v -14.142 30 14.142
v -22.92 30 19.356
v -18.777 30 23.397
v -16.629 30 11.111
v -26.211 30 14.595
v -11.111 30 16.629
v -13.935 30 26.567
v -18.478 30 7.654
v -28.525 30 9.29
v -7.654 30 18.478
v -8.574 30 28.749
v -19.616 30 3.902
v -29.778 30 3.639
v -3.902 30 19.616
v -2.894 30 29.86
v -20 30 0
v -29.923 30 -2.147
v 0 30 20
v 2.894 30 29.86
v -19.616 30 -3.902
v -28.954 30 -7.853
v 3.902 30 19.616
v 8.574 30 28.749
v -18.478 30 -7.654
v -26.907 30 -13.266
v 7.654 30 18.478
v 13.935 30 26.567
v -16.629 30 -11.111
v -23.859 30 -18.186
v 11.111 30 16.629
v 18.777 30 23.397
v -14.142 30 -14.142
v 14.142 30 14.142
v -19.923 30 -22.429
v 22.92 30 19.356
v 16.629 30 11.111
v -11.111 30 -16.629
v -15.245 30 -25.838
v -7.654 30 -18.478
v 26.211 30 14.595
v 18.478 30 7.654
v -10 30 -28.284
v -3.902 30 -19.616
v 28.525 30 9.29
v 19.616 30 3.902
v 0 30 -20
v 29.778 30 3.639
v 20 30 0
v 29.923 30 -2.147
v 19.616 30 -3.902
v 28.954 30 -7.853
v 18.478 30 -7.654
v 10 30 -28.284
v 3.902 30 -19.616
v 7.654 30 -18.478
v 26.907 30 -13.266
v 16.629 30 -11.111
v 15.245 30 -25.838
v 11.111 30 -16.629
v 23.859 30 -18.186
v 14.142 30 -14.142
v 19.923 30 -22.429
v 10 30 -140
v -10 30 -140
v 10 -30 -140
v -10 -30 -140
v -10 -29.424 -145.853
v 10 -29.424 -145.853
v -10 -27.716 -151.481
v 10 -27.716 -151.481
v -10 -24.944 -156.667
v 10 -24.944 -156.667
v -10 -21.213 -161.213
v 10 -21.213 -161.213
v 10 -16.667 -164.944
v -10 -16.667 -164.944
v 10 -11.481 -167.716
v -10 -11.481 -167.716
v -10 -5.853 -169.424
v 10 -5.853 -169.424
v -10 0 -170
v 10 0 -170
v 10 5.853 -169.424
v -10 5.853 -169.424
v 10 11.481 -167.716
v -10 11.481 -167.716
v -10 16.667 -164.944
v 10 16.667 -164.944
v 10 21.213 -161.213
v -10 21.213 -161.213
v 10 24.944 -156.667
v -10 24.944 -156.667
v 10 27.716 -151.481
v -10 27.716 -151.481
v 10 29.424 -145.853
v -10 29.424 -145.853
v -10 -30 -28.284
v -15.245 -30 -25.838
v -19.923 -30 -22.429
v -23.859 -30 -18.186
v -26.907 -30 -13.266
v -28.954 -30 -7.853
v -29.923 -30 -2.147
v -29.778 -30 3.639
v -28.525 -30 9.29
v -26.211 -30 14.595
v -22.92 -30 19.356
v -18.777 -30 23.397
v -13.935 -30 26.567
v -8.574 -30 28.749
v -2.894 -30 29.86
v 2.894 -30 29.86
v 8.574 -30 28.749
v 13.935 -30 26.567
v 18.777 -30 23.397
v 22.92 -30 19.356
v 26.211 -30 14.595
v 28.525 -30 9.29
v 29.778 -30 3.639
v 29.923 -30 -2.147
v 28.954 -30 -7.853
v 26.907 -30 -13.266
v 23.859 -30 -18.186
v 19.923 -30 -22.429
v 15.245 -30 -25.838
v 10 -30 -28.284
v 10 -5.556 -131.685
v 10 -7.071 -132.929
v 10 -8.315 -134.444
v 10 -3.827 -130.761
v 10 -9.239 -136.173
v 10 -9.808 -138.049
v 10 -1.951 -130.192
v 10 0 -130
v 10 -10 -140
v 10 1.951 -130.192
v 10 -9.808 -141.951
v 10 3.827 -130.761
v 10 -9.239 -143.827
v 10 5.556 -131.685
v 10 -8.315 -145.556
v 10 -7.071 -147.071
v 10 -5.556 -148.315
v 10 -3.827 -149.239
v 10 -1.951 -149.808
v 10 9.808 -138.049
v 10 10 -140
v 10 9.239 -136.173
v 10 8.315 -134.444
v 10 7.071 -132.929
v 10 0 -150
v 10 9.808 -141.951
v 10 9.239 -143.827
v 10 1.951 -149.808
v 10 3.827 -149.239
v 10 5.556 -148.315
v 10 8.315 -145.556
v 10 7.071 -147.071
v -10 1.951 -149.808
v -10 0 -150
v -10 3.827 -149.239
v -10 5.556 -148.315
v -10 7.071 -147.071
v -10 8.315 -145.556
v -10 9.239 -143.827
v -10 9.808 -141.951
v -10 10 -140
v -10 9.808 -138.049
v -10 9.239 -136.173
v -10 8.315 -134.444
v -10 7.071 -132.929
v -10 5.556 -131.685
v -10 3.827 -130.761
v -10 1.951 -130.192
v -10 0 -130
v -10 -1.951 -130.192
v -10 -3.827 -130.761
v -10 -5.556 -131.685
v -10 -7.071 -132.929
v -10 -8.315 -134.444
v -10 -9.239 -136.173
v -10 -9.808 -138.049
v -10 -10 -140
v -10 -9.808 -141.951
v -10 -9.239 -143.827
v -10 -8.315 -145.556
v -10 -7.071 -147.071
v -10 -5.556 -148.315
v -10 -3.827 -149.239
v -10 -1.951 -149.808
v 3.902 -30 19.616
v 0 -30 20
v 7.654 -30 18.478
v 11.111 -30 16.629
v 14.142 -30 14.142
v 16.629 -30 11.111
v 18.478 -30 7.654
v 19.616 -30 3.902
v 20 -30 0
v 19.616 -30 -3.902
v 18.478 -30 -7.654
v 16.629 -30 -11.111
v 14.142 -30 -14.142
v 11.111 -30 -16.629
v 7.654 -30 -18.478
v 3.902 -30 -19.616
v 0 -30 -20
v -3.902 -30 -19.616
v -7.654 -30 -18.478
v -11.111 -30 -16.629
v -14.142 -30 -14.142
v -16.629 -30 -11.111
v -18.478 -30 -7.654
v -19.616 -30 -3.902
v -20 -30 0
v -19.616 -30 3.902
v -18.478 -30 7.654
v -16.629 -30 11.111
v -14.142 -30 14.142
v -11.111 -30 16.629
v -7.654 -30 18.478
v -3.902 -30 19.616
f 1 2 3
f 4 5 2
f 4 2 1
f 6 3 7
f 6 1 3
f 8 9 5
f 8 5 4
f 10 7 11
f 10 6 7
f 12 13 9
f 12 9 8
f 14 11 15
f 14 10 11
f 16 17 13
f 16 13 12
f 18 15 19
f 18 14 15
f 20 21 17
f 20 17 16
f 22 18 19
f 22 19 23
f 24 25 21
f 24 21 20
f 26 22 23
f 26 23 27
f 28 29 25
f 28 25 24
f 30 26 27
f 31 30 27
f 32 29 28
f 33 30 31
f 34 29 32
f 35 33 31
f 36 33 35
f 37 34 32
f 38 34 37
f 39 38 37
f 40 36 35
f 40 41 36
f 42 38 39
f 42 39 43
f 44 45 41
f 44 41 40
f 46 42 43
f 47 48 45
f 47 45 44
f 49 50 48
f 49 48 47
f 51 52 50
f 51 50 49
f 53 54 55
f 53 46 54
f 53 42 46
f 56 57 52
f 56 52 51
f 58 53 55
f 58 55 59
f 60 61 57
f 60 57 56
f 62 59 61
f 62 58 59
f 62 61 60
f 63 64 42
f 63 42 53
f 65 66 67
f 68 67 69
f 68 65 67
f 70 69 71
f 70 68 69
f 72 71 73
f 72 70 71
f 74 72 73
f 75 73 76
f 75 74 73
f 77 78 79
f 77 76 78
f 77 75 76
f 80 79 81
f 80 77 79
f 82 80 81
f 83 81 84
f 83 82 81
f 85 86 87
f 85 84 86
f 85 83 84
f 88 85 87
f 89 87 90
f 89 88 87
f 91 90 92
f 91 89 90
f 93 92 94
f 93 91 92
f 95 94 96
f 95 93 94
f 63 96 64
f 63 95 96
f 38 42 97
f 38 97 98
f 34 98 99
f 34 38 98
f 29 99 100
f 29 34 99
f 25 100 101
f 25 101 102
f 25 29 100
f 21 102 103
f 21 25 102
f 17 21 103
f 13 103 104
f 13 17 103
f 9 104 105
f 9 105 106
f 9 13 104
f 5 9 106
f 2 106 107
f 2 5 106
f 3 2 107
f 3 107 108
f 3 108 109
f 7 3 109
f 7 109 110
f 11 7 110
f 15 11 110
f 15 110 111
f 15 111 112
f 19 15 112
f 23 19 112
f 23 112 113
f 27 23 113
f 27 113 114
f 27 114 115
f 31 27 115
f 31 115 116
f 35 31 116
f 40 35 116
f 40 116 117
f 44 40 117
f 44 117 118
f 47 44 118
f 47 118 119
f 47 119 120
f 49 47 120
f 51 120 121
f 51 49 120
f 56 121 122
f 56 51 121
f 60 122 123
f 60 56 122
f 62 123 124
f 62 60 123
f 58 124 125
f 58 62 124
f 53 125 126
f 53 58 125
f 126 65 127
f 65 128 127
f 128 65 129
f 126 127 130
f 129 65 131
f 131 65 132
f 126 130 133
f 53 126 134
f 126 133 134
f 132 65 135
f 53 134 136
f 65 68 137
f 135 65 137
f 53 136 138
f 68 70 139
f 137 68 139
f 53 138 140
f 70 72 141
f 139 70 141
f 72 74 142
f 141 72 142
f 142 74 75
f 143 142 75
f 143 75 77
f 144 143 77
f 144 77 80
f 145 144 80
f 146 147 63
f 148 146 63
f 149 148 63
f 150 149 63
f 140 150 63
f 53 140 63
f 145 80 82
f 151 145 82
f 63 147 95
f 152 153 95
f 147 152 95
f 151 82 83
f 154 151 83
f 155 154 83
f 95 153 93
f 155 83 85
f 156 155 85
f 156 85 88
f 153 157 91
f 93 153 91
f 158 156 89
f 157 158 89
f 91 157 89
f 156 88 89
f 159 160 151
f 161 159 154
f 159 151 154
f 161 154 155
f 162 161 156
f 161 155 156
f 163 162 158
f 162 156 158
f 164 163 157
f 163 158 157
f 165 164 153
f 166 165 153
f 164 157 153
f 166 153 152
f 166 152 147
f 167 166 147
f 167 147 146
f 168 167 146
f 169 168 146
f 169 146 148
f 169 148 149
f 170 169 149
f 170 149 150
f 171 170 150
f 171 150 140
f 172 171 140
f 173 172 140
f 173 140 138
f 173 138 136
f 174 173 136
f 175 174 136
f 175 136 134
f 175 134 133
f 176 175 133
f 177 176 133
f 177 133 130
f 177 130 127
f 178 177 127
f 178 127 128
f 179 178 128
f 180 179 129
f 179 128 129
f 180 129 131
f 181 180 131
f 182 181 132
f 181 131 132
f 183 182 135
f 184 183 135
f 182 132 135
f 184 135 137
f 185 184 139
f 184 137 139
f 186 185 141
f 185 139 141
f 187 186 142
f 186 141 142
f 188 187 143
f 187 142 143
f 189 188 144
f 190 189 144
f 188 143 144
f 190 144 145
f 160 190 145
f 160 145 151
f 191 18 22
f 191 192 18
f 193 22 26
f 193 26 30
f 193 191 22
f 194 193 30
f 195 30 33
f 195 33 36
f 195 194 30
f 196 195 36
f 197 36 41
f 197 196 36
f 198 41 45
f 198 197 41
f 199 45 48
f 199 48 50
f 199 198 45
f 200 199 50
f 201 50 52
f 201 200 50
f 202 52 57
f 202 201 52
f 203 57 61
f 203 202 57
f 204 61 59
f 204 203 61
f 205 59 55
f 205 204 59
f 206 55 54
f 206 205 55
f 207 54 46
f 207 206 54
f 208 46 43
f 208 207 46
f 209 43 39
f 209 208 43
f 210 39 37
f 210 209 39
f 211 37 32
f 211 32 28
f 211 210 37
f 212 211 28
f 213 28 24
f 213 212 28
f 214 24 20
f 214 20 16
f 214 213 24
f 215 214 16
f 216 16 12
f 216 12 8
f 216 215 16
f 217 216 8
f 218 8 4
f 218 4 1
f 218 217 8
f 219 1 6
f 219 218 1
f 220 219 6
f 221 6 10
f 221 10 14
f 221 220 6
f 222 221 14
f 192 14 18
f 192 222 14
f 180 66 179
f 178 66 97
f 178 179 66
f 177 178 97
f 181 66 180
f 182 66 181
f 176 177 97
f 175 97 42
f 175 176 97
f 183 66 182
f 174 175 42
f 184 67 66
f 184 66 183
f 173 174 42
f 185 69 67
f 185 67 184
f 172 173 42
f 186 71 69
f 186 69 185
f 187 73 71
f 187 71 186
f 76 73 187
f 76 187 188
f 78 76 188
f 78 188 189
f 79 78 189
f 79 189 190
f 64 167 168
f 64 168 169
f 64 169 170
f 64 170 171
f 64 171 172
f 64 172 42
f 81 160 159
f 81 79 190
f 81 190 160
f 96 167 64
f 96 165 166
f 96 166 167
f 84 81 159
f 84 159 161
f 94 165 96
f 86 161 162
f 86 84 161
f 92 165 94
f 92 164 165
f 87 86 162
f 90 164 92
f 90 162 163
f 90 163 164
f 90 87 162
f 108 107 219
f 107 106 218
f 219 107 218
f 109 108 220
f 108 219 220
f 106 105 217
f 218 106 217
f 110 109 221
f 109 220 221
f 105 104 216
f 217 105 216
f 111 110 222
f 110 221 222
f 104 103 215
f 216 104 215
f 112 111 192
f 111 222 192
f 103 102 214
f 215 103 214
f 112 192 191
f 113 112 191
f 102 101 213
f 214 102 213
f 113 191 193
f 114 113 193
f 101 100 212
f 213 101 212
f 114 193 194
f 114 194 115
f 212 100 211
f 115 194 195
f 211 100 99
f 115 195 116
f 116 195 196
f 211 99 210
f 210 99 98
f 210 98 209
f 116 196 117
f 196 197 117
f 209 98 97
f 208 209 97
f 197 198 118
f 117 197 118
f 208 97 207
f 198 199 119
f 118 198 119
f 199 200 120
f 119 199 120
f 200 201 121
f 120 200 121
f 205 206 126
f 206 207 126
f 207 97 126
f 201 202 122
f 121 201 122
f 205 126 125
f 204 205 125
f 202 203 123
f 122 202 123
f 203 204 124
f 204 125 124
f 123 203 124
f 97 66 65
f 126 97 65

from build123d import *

# Parameters (mm, degrees)
SKETCH_1_R           = 30
SKETCH_1_R_2         = 20
EXTRUDE_1_DEPTH      = 30
SKETCH_2_W           = 140
SKETCH_2_H           = 60
EXTRUDE_2_DEPTH      = 10
SKETCH_3_R           = 10
CUT_EXTRUDE_1_DEPTH  = 178.200451467
FILLET_1_RADIUS      = 30
FILLET_1_LENGTH      = 20
EXTRUDE_3_REACH      = 148.287
EXTRUDE_3_END_RADIUS = 30
SKETCH_4_W           = 20
SKETCH_4_H           = 60


with BuildPart() as part:
    # 草图1 → 凸台-拉伸1 (new, symmetric)
    with BuildSketch(Plane(origin=(0, 0, 0), x_dir=(1, 0, 0), z_dir=(0, 1, 0))):
        with Locations(Location((0, 0, 0), (0, 0, 270))):
            Circle(SKETCH_1_R)
        with Locations(Location((0, 0, 0), (0, 0, 270))):
            Circle(SKETCH_1_R_2, mode=Mode.SUBTRACT)
    extrude(amount=EXTRUDE_1_DEPTH, both=True)



with BuildPart() as body_2:
    # 草图2 → 凸台-拉伸2 (new, symmetric)
    with BuildSketch(Plane(origin=(0, 0, 0), x_dir=(0, 0, -1), z_dir=(1, 0, 0))):
        with Locations((100, 0)):
            Rectangle(SKETCH_2_W, SKETCH_2_H)
    extrude(amount=EXTRUDE_2_DEPTH, both=True)

    # 草图3 → 切除-拉伸1 (cut, through all)
    with BuildSketch(Plane(origin=(10, 0, 0), x_dir=(0, 0, -1), z_dir=(1, 0, 0))):
        with Locations((140, 0)):
            Circle(SKETCH_3_R)
    extrude(amount=-CUT_EXTRUDE_1_DEPTH, mode=Mode.SUBTRACT)

    # 圆角1: full round fillet: the end face becomes a half cylinder, R = half its width
    fillet_1_face = Plane((0, 0, -170), x_dir=(1, 0, 0), z_dir=(0, 0, -1))  # on the end face: x along it, z out of the body
    fillet_1_slab = fillet_1_face.offset(-FILLET_1_RADIUS / 2) * Box(FILLET_1_LENGTH, 2 * FILLET_1_RADIUS, FILLET_1_RADIUS, mode=Mode.PRIVATE)  # the body's end, R deep
    fillet_1_round = Plane((0, 0, -140), x_dir=(0, 0, -1), z_dir=(1, 0, 0)) * Cylinder(FILLET_1_RADIUS, FILLET_1_LENGTH, mode=Mode.PRIVATE)  # its axis R under the face
    add(fillet_1_slab - fillet_1_round, mode=Mode.SUBTRACT)


with BuildPart() as part_1:
    add(part.part)

    add(body_2.part)  # 凸台-拉伸3 merges body 2
    # 凸台-拉伸3: up to this cylinder (the profile starts outside it)
    extrude_3_end = Plane(origin=(0, 0, 0), z_dir=(0, -1, 0)) * Cylinder(EXTRUDE_3_END_RADIUS, 357.574, mode=Mode.PRIVATE)
    # 草图4 → 凸台-拉伸3 (add, up to the surface)
    with BuildSketch(Plane.XY.offset(-30), mode=Mode.PRIVATE) as extrude_3_sk1:
        Rectangle(SKETCH_4_W, SKETCH_4_H)
    extrude_3_tool1 = extrude(extrude_3_sk1.sketch, amount=EXTRUDE_3_REACH, mode=Mode.PRIVATE) - extrude_3_end
    add(extrude_3_tool1.solids().sort_by_distance((0, 0, -30))[0])
    add(extrude_3_tool1.solids().sort_by_distance((0, 0, -30))[1])


solid = part_1.part
